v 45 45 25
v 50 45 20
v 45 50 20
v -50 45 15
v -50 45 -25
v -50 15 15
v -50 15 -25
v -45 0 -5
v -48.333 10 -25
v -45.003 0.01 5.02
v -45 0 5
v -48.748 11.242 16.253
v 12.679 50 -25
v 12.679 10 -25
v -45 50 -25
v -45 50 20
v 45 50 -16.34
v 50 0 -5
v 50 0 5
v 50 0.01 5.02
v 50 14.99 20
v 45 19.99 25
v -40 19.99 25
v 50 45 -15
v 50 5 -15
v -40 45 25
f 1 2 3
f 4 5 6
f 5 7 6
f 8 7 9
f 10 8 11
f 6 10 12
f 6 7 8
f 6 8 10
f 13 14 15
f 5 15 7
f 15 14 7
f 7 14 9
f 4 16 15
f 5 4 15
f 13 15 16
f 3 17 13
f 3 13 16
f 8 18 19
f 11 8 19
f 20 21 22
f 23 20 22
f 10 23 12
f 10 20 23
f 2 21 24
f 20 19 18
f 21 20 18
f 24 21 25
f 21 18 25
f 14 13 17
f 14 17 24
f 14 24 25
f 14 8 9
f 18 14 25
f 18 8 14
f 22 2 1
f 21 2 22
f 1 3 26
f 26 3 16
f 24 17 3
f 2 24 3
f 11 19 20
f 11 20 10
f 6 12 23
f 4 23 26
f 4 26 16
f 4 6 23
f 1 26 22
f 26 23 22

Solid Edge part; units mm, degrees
sketch "Sketch1" plane through (0, 0, 0) normal (0, -1, 0) x (1, 0, 0)
  line L0 (-50, 25) -> (50, 25)
  line L1 (50, 25) -> (50, -25)
  line L2 (50, -25) -> (-50, -25)
  line L3 (-50, -25) -> (-50, 25)
  dimension "D1" = 100
  dimension "D2" = 50
extrude "Protrusion1" add sketch "Sketch1" against normal blind 50
chamfer "Chamfer1" distance 5 angle 45 3 edges at (50, 50, 0) (50, 25, 25) (0, 50, 25)
chamfer "Chamfer2" distance 5 angle 45 1 edges at (-50, 50, -2.5)
chamfer "Chamfer3" distance 5 distance2 15 1 edges at (-50, 0, 0) measured on face at (-32.3333, 0, -17.1667)
chamfer "Chamfer4" distance 10 distance2 20 1 edges at (2.5, 0, -25) measured on face at (34.3333, 41.1667, -25)
chamfer "Chamfer5" distance 10 distance2 20 1 edges at (0, 0, 25) measured on face at (-35.1167, 37.05, 25)
chamfer "Chamfer6" distance 10 angle 75 1 edges at (50, 27.5, -25) measured on face at (50, 37.05, 12.95)
chamfer "Chamfer7" distance 10 angle 45 2 edges at (-1.6667, 10, 25) (-50, 30, 25) measured on face at (-35.1167, 38.8167, 25)
properties material "알루미늄, 1060"
